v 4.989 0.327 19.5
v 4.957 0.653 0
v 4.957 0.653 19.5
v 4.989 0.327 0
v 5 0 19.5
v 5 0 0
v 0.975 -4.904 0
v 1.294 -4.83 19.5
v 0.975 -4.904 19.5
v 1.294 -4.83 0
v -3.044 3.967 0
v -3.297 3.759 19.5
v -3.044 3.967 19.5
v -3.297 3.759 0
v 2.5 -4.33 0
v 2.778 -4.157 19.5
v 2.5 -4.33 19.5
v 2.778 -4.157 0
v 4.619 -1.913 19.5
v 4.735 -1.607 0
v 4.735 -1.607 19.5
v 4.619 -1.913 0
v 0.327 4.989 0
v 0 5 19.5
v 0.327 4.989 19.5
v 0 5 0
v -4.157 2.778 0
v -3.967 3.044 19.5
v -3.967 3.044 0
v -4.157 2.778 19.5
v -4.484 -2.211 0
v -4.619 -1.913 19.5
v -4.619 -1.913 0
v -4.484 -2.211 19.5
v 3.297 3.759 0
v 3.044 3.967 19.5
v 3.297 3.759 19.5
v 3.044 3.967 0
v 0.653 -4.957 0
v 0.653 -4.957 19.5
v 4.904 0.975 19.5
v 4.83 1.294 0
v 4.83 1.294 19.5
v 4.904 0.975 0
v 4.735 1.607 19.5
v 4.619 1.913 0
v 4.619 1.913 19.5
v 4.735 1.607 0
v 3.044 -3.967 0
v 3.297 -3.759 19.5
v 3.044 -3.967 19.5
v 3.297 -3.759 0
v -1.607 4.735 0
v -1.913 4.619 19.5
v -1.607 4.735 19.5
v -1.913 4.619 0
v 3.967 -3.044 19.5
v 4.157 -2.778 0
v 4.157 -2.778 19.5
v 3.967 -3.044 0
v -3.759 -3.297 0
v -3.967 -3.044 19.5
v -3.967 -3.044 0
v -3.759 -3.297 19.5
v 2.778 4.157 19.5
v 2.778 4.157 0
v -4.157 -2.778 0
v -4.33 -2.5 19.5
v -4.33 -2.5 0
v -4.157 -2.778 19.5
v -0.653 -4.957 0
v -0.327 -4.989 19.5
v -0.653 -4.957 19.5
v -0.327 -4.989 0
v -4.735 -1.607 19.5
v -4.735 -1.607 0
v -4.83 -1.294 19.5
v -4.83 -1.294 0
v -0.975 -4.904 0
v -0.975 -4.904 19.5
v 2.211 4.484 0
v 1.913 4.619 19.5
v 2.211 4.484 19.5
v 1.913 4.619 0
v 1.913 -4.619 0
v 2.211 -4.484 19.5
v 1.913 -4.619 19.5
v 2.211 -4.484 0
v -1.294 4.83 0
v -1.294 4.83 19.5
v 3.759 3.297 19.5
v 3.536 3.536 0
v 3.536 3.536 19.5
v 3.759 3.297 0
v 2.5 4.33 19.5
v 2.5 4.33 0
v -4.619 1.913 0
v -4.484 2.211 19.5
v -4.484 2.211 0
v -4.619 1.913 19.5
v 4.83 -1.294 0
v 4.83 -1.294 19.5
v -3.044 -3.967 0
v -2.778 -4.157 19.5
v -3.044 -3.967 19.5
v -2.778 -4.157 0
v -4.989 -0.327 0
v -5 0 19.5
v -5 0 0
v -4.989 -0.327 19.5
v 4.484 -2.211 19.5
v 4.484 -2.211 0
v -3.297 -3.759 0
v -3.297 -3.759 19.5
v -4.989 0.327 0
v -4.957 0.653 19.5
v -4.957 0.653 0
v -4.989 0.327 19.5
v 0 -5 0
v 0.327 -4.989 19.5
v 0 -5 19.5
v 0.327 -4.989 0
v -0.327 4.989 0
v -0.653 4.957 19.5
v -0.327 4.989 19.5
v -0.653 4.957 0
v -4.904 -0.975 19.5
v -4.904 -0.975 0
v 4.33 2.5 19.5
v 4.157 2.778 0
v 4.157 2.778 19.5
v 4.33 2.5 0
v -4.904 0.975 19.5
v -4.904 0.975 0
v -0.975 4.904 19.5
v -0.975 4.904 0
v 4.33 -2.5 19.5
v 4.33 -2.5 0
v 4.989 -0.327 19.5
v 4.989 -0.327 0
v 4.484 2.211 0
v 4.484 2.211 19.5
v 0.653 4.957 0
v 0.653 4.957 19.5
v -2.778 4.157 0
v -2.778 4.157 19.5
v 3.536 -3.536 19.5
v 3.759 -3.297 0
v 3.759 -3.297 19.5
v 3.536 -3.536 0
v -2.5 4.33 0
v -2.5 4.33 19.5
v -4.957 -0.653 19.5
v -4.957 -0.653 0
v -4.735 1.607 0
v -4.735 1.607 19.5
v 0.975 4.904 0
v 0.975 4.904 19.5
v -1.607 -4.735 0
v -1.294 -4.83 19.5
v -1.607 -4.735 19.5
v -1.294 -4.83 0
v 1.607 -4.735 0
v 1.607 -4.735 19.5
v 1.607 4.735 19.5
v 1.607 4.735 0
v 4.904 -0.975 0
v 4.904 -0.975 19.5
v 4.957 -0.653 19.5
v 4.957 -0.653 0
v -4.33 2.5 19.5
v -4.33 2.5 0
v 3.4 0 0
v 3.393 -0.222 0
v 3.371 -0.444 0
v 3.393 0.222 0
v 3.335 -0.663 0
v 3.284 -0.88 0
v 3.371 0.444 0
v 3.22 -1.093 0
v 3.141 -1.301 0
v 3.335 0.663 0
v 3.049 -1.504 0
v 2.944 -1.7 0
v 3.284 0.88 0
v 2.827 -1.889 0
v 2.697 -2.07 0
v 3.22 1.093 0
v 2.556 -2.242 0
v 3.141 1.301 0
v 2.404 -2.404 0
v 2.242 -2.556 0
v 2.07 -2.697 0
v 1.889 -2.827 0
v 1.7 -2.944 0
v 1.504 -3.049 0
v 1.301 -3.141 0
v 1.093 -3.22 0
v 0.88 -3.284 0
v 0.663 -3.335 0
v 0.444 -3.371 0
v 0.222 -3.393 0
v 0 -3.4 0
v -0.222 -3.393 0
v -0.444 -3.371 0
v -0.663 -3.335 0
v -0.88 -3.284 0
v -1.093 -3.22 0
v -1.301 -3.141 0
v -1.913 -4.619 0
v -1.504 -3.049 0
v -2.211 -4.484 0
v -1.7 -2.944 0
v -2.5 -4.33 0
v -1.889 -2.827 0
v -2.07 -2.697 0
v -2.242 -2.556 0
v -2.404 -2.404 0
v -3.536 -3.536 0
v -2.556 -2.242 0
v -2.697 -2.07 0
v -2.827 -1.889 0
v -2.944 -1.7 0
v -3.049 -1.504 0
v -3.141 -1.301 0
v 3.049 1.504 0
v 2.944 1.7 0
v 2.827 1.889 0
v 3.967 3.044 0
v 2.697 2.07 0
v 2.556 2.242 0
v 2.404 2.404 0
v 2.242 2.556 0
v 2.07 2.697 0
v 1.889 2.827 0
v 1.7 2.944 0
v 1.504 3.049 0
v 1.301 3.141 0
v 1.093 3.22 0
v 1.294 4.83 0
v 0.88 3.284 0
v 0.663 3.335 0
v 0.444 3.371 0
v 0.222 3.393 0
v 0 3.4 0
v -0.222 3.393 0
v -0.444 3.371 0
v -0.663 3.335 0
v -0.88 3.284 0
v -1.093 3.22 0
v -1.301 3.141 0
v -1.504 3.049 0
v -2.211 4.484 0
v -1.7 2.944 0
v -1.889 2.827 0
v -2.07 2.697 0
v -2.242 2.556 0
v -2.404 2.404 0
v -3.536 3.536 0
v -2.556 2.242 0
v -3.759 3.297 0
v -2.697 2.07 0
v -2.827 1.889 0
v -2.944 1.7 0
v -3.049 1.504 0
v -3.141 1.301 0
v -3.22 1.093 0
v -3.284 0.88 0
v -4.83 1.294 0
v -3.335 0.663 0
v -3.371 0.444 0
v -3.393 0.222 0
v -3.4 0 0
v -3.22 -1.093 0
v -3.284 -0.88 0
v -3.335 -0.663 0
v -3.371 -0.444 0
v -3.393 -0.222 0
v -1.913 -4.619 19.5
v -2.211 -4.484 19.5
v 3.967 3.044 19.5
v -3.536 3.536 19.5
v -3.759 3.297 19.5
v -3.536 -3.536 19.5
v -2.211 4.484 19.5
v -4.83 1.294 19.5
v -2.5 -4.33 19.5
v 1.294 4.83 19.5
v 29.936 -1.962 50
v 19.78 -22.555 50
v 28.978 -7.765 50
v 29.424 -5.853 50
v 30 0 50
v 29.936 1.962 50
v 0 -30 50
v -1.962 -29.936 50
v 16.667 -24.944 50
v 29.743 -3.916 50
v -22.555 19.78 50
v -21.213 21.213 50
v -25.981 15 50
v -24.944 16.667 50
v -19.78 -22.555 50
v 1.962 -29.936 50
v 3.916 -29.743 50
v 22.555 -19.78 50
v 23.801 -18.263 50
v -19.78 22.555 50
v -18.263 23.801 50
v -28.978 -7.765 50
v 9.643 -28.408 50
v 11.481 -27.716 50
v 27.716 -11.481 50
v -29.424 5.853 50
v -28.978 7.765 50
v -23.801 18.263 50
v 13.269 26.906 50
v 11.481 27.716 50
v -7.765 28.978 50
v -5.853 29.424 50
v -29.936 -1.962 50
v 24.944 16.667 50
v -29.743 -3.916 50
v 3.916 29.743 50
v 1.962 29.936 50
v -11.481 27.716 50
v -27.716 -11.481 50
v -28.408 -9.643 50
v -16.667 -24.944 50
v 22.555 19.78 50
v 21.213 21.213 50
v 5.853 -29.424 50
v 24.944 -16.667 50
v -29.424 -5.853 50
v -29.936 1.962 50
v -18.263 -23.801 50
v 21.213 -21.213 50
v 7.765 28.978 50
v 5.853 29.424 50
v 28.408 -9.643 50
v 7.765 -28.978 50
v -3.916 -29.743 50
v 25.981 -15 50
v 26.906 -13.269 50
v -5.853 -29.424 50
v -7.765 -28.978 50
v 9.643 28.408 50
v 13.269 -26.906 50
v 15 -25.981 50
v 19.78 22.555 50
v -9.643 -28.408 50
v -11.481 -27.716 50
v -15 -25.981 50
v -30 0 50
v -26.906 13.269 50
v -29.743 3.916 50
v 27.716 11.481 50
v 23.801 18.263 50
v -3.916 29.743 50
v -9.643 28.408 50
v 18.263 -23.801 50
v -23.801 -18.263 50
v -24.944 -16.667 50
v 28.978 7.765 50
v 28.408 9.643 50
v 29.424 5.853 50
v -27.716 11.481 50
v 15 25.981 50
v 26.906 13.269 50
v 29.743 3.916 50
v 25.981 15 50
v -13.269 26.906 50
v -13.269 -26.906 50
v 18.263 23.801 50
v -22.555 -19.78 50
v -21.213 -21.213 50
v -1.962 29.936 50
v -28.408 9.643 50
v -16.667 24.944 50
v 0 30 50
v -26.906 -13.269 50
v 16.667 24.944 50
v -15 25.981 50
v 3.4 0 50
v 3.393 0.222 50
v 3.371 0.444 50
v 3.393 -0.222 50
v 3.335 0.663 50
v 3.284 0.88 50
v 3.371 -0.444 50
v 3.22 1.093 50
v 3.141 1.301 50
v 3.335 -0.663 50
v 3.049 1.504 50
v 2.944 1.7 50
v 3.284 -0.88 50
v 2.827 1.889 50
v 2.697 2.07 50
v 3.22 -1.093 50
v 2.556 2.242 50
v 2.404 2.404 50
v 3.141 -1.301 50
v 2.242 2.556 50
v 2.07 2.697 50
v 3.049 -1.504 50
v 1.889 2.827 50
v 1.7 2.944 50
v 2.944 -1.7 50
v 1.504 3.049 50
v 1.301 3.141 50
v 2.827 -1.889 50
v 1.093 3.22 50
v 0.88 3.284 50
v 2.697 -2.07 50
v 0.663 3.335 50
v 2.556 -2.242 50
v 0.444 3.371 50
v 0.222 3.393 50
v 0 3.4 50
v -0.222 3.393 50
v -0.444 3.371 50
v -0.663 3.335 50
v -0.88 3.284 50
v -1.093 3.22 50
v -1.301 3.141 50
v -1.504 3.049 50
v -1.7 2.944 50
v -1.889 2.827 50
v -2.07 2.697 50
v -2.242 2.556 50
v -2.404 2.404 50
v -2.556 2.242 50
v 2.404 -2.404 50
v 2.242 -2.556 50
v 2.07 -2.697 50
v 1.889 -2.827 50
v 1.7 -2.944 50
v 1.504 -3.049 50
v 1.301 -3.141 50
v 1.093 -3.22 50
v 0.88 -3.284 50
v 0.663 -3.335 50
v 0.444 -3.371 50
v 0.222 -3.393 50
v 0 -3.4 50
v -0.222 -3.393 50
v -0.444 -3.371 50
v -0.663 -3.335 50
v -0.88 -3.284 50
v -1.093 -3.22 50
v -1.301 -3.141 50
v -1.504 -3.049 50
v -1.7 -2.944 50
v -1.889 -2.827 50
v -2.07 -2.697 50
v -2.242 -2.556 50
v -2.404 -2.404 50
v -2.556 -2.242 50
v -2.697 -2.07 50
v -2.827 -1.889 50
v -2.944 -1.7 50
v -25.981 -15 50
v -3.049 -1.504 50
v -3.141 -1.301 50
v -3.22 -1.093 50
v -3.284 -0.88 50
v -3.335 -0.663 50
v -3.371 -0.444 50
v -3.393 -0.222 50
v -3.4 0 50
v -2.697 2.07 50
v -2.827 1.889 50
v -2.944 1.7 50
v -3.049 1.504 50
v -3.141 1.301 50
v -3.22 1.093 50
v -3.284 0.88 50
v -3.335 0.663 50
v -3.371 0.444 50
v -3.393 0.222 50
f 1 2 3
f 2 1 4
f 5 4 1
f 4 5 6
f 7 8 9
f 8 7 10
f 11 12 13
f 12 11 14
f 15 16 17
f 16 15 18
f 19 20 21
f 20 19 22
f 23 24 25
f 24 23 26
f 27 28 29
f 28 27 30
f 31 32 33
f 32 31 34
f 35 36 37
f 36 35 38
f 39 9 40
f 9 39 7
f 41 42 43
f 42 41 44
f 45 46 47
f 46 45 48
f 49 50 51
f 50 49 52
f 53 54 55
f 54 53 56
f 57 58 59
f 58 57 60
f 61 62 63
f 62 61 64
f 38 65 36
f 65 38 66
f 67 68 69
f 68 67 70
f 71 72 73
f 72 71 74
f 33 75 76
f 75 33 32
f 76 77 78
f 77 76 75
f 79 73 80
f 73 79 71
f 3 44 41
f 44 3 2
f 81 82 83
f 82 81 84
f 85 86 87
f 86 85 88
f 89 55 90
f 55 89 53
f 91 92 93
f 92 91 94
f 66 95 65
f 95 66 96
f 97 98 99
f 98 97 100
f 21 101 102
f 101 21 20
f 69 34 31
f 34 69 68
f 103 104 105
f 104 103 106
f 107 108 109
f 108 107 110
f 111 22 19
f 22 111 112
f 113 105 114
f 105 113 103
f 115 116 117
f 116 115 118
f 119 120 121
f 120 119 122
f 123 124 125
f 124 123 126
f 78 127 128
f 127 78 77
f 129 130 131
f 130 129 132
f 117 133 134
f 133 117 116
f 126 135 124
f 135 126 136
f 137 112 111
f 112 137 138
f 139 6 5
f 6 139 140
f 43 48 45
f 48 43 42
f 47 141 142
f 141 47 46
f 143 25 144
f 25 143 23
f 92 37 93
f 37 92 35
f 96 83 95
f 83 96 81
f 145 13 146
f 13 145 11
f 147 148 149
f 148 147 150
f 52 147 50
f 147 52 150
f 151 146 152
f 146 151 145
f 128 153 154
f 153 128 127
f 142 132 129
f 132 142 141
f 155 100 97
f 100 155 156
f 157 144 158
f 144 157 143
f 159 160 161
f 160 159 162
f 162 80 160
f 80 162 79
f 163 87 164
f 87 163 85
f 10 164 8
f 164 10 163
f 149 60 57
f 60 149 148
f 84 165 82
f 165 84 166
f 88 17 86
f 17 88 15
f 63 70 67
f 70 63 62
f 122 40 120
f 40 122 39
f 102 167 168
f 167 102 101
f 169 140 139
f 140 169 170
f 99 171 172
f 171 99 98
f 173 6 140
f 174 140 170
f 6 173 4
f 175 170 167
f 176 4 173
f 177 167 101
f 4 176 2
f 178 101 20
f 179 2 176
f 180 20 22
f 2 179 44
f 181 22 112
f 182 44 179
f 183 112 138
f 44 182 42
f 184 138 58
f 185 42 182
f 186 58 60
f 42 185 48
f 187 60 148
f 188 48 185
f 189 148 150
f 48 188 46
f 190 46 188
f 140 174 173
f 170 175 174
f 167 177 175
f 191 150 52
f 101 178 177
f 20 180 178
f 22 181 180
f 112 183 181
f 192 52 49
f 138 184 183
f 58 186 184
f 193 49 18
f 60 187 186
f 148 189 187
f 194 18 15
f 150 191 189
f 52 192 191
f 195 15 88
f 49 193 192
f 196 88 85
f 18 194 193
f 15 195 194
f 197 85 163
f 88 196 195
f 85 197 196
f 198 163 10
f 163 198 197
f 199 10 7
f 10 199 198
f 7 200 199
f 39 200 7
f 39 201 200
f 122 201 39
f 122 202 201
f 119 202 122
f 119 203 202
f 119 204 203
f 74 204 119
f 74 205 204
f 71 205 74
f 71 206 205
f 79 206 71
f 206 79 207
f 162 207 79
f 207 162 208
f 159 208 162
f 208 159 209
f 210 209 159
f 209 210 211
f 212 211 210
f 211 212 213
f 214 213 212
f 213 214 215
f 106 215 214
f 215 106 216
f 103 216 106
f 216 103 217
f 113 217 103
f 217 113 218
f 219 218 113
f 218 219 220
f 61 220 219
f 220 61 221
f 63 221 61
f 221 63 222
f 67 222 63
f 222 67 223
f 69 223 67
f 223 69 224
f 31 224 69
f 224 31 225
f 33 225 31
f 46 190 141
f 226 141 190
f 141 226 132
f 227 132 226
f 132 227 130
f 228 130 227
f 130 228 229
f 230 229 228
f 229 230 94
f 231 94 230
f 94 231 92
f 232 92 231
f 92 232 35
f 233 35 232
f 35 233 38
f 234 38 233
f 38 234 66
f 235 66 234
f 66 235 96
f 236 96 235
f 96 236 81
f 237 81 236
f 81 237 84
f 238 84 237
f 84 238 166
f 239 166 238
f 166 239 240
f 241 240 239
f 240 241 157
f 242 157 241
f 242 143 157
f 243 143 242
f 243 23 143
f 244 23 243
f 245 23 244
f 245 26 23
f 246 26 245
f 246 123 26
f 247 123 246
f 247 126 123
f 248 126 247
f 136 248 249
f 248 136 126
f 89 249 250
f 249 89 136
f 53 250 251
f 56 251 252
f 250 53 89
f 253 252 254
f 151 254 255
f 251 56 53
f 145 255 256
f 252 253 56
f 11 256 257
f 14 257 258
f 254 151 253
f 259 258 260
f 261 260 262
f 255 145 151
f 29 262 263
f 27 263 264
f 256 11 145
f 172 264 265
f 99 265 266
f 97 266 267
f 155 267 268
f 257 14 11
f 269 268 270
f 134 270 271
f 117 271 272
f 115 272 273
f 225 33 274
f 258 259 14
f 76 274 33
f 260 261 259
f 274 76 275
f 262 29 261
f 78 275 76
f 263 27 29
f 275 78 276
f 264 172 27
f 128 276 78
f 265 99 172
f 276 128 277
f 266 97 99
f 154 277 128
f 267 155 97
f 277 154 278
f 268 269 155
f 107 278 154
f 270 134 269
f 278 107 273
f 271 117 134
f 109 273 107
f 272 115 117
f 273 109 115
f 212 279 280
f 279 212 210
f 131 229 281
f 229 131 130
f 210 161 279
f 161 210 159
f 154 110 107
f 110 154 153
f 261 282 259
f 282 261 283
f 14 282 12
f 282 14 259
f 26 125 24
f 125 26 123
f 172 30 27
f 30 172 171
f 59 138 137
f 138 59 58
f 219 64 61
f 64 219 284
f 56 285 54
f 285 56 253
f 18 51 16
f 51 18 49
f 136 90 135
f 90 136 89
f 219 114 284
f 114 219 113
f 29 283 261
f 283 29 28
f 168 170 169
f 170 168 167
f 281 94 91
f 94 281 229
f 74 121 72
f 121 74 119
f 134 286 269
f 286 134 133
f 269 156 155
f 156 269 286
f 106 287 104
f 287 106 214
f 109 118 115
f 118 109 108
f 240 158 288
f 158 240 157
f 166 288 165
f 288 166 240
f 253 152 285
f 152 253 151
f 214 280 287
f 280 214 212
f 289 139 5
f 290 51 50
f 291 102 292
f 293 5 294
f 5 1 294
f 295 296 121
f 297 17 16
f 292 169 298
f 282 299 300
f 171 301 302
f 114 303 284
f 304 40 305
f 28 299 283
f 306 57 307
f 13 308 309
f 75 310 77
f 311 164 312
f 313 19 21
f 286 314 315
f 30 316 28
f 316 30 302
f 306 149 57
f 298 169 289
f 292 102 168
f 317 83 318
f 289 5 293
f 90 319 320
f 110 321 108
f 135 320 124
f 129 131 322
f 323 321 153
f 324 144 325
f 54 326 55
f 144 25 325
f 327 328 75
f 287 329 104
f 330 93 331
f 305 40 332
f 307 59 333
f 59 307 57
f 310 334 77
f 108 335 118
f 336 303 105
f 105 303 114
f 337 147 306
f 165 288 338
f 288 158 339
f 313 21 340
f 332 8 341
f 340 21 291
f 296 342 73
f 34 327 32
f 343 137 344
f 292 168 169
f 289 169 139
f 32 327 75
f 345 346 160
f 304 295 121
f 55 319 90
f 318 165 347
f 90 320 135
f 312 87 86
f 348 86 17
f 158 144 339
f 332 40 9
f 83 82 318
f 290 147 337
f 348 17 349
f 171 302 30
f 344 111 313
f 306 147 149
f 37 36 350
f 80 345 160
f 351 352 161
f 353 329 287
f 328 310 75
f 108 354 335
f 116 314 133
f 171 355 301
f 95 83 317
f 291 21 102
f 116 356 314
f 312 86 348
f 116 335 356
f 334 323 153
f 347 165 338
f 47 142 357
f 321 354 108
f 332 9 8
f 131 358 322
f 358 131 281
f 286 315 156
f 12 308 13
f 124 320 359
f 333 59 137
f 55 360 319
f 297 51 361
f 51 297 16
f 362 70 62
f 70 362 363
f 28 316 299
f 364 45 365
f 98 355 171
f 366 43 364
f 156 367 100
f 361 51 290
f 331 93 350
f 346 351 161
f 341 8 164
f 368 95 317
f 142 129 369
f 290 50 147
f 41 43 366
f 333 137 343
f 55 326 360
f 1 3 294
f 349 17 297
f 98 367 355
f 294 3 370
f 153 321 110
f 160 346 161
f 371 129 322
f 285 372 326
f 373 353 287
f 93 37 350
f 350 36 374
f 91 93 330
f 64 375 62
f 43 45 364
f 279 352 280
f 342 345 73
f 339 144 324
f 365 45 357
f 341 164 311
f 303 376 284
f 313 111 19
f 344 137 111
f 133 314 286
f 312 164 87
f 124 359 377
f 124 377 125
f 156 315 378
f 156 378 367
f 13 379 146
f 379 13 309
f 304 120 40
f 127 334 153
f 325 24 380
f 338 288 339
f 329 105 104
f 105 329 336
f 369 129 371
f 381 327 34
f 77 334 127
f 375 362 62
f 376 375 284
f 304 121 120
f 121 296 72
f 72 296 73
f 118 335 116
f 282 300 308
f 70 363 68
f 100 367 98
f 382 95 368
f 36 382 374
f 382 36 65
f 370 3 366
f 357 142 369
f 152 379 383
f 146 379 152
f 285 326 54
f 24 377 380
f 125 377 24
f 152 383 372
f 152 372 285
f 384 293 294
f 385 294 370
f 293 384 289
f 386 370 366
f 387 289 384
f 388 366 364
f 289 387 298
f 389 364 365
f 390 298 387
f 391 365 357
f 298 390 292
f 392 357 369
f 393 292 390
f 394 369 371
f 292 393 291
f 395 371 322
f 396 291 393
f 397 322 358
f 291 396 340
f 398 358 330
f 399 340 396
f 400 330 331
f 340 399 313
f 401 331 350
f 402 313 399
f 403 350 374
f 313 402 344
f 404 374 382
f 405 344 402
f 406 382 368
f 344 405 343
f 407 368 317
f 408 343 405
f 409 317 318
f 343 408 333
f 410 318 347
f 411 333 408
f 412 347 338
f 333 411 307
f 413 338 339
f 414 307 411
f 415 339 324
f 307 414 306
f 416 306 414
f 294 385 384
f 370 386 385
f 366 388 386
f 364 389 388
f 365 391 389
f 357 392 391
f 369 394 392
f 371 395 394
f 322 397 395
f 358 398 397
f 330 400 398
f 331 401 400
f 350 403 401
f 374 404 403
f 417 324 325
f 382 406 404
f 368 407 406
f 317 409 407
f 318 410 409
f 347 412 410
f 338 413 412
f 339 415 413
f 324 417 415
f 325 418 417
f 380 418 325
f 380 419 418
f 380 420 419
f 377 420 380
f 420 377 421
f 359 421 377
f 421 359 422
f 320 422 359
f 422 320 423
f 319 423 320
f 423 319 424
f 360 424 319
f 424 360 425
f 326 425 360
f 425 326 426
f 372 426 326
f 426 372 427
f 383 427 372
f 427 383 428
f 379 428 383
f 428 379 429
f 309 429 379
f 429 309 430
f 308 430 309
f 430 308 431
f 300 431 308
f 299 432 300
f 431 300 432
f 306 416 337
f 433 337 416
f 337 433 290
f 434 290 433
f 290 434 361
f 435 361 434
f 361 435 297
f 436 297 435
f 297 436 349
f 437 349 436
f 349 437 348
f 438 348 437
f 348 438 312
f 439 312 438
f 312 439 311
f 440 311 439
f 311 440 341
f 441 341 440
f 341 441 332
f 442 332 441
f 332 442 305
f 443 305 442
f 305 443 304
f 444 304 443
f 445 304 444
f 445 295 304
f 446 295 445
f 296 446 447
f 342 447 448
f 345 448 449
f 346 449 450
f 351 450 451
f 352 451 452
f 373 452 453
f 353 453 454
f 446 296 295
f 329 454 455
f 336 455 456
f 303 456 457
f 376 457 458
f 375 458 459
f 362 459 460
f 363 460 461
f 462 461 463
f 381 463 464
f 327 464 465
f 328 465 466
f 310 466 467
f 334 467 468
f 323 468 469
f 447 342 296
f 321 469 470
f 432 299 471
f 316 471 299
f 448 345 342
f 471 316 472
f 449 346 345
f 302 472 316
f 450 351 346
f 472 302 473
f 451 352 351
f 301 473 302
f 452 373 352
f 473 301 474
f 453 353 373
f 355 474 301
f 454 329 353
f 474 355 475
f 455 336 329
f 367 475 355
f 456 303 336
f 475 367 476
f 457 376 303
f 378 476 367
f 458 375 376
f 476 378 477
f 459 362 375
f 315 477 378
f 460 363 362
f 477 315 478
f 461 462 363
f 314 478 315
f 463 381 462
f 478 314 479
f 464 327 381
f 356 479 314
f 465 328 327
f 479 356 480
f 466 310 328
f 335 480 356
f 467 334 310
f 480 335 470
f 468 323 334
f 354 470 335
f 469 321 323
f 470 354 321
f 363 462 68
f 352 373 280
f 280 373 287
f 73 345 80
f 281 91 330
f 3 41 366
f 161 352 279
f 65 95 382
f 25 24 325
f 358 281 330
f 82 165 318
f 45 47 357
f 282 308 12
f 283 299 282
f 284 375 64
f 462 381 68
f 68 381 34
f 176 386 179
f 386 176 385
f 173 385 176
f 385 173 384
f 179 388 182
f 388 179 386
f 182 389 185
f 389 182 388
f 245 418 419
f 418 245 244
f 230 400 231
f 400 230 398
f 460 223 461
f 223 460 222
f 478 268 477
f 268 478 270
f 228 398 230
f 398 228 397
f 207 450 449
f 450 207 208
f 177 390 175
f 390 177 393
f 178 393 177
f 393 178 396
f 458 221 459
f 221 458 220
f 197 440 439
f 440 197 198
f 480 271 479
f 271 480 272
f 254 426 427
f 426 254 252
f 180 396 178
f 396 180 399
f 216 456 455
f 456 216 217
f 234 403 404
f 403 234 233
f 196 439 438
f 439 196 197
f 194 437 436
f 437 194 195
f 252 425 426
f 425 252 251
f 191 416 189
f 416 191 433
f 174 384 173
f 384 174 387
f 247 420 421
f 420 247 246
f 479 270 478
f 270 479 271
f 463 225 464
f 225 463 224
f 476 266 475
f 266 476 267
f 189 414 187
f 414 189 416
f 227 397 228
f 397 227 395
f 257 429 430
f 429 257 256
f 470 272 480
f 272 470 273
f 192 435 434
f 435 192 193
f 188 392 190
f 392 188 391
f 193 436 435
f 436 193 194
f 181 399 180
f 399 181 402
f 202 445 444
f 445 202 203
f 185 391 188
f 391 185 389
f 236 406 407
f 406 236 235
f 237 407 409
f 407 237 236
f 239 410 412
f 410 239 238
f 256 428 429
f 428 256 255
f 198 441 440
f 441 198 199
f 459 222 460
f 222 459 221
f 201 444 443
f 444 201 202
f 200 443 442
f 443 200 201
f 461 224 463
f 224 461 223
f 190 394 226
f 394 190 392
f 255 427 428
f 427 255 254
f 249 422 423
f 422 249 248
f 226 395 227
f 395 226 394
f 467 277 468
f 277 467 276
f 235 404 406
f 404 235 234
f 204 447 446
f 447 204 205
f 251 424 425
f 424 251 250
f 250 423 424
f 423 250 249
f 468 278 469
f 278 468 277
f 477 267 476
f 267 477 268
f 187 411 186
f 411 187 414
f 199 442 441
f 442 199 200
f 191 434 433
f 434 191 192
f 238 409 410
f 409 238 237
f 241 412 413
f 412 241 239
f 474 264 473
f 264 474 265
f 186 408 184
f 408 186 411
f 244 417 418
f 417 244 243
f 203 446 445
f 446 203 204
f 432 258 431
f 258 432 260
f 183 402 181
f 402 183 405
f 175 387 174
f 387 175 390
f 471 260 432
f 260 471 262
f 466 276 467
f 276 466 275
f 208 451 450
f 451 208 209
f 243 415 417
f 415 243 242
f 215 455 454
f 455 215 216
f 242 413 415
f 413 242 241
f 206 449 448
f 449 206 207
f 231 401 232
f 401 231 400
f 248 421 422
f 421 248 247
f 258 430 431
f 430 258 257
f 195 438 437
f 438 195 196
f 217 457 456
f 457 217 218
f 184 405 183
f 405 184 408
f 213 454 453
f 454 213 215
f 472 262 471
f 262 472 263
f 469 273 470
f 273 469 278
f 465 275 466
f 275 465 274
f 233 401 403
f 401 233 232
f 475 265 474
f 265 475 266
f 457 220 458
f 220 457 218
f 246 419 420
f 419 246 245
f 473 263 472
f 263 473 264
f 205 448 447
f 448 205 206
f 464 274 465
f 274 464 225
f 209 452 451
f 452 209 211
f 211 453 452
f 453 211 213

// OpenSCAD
// Small lab funnel, printed upright with the wide opening at the top
// Units: mm

$fn = 96;

// ---- Spout ----
spout_od      = 10;    // outer diameter of straight spout
spout_len     = 20;    // length of spout (z = 0 to z = 20)
spout_wall    = 1.6;   // wall thickness of spout
spout_id      = spout_od - 2 * spout_wall; // bore diameter (6.8 mm)

// ---- Cone ----
cone_top_od   = 60;    // outer diameter at rim (z = 50)
cone_bottom_od = 10;   // outer diameter where cone meets spout (z = 20)
cone_h        = 30;    // cone height (z = 20 to z = 50)

// ---- Join ----
overlap       = 0.5;   // spout extends into cone to fuse solids

// ---- Cut ----
cut_ext       = 0.5;   // extension of bore cut past faces

difference() {
    union() {
        // Spout
        cylinder(d = spout_od, h = spout_len + overlap);

        // Cone
        translate([0, 0, spout_len - overlap])
            cylinder(d1 = cone_bottom_od, d2 = cone_top_od, h = cone_h + overlap);
    }

    // Through-bore: straight cylinder from z = 0 past the rim
    translate([0, 0, -cut_ext])
        cylinder(d = spout_id, h = spout_len + overlap + cone_h + cut_ext);
}
